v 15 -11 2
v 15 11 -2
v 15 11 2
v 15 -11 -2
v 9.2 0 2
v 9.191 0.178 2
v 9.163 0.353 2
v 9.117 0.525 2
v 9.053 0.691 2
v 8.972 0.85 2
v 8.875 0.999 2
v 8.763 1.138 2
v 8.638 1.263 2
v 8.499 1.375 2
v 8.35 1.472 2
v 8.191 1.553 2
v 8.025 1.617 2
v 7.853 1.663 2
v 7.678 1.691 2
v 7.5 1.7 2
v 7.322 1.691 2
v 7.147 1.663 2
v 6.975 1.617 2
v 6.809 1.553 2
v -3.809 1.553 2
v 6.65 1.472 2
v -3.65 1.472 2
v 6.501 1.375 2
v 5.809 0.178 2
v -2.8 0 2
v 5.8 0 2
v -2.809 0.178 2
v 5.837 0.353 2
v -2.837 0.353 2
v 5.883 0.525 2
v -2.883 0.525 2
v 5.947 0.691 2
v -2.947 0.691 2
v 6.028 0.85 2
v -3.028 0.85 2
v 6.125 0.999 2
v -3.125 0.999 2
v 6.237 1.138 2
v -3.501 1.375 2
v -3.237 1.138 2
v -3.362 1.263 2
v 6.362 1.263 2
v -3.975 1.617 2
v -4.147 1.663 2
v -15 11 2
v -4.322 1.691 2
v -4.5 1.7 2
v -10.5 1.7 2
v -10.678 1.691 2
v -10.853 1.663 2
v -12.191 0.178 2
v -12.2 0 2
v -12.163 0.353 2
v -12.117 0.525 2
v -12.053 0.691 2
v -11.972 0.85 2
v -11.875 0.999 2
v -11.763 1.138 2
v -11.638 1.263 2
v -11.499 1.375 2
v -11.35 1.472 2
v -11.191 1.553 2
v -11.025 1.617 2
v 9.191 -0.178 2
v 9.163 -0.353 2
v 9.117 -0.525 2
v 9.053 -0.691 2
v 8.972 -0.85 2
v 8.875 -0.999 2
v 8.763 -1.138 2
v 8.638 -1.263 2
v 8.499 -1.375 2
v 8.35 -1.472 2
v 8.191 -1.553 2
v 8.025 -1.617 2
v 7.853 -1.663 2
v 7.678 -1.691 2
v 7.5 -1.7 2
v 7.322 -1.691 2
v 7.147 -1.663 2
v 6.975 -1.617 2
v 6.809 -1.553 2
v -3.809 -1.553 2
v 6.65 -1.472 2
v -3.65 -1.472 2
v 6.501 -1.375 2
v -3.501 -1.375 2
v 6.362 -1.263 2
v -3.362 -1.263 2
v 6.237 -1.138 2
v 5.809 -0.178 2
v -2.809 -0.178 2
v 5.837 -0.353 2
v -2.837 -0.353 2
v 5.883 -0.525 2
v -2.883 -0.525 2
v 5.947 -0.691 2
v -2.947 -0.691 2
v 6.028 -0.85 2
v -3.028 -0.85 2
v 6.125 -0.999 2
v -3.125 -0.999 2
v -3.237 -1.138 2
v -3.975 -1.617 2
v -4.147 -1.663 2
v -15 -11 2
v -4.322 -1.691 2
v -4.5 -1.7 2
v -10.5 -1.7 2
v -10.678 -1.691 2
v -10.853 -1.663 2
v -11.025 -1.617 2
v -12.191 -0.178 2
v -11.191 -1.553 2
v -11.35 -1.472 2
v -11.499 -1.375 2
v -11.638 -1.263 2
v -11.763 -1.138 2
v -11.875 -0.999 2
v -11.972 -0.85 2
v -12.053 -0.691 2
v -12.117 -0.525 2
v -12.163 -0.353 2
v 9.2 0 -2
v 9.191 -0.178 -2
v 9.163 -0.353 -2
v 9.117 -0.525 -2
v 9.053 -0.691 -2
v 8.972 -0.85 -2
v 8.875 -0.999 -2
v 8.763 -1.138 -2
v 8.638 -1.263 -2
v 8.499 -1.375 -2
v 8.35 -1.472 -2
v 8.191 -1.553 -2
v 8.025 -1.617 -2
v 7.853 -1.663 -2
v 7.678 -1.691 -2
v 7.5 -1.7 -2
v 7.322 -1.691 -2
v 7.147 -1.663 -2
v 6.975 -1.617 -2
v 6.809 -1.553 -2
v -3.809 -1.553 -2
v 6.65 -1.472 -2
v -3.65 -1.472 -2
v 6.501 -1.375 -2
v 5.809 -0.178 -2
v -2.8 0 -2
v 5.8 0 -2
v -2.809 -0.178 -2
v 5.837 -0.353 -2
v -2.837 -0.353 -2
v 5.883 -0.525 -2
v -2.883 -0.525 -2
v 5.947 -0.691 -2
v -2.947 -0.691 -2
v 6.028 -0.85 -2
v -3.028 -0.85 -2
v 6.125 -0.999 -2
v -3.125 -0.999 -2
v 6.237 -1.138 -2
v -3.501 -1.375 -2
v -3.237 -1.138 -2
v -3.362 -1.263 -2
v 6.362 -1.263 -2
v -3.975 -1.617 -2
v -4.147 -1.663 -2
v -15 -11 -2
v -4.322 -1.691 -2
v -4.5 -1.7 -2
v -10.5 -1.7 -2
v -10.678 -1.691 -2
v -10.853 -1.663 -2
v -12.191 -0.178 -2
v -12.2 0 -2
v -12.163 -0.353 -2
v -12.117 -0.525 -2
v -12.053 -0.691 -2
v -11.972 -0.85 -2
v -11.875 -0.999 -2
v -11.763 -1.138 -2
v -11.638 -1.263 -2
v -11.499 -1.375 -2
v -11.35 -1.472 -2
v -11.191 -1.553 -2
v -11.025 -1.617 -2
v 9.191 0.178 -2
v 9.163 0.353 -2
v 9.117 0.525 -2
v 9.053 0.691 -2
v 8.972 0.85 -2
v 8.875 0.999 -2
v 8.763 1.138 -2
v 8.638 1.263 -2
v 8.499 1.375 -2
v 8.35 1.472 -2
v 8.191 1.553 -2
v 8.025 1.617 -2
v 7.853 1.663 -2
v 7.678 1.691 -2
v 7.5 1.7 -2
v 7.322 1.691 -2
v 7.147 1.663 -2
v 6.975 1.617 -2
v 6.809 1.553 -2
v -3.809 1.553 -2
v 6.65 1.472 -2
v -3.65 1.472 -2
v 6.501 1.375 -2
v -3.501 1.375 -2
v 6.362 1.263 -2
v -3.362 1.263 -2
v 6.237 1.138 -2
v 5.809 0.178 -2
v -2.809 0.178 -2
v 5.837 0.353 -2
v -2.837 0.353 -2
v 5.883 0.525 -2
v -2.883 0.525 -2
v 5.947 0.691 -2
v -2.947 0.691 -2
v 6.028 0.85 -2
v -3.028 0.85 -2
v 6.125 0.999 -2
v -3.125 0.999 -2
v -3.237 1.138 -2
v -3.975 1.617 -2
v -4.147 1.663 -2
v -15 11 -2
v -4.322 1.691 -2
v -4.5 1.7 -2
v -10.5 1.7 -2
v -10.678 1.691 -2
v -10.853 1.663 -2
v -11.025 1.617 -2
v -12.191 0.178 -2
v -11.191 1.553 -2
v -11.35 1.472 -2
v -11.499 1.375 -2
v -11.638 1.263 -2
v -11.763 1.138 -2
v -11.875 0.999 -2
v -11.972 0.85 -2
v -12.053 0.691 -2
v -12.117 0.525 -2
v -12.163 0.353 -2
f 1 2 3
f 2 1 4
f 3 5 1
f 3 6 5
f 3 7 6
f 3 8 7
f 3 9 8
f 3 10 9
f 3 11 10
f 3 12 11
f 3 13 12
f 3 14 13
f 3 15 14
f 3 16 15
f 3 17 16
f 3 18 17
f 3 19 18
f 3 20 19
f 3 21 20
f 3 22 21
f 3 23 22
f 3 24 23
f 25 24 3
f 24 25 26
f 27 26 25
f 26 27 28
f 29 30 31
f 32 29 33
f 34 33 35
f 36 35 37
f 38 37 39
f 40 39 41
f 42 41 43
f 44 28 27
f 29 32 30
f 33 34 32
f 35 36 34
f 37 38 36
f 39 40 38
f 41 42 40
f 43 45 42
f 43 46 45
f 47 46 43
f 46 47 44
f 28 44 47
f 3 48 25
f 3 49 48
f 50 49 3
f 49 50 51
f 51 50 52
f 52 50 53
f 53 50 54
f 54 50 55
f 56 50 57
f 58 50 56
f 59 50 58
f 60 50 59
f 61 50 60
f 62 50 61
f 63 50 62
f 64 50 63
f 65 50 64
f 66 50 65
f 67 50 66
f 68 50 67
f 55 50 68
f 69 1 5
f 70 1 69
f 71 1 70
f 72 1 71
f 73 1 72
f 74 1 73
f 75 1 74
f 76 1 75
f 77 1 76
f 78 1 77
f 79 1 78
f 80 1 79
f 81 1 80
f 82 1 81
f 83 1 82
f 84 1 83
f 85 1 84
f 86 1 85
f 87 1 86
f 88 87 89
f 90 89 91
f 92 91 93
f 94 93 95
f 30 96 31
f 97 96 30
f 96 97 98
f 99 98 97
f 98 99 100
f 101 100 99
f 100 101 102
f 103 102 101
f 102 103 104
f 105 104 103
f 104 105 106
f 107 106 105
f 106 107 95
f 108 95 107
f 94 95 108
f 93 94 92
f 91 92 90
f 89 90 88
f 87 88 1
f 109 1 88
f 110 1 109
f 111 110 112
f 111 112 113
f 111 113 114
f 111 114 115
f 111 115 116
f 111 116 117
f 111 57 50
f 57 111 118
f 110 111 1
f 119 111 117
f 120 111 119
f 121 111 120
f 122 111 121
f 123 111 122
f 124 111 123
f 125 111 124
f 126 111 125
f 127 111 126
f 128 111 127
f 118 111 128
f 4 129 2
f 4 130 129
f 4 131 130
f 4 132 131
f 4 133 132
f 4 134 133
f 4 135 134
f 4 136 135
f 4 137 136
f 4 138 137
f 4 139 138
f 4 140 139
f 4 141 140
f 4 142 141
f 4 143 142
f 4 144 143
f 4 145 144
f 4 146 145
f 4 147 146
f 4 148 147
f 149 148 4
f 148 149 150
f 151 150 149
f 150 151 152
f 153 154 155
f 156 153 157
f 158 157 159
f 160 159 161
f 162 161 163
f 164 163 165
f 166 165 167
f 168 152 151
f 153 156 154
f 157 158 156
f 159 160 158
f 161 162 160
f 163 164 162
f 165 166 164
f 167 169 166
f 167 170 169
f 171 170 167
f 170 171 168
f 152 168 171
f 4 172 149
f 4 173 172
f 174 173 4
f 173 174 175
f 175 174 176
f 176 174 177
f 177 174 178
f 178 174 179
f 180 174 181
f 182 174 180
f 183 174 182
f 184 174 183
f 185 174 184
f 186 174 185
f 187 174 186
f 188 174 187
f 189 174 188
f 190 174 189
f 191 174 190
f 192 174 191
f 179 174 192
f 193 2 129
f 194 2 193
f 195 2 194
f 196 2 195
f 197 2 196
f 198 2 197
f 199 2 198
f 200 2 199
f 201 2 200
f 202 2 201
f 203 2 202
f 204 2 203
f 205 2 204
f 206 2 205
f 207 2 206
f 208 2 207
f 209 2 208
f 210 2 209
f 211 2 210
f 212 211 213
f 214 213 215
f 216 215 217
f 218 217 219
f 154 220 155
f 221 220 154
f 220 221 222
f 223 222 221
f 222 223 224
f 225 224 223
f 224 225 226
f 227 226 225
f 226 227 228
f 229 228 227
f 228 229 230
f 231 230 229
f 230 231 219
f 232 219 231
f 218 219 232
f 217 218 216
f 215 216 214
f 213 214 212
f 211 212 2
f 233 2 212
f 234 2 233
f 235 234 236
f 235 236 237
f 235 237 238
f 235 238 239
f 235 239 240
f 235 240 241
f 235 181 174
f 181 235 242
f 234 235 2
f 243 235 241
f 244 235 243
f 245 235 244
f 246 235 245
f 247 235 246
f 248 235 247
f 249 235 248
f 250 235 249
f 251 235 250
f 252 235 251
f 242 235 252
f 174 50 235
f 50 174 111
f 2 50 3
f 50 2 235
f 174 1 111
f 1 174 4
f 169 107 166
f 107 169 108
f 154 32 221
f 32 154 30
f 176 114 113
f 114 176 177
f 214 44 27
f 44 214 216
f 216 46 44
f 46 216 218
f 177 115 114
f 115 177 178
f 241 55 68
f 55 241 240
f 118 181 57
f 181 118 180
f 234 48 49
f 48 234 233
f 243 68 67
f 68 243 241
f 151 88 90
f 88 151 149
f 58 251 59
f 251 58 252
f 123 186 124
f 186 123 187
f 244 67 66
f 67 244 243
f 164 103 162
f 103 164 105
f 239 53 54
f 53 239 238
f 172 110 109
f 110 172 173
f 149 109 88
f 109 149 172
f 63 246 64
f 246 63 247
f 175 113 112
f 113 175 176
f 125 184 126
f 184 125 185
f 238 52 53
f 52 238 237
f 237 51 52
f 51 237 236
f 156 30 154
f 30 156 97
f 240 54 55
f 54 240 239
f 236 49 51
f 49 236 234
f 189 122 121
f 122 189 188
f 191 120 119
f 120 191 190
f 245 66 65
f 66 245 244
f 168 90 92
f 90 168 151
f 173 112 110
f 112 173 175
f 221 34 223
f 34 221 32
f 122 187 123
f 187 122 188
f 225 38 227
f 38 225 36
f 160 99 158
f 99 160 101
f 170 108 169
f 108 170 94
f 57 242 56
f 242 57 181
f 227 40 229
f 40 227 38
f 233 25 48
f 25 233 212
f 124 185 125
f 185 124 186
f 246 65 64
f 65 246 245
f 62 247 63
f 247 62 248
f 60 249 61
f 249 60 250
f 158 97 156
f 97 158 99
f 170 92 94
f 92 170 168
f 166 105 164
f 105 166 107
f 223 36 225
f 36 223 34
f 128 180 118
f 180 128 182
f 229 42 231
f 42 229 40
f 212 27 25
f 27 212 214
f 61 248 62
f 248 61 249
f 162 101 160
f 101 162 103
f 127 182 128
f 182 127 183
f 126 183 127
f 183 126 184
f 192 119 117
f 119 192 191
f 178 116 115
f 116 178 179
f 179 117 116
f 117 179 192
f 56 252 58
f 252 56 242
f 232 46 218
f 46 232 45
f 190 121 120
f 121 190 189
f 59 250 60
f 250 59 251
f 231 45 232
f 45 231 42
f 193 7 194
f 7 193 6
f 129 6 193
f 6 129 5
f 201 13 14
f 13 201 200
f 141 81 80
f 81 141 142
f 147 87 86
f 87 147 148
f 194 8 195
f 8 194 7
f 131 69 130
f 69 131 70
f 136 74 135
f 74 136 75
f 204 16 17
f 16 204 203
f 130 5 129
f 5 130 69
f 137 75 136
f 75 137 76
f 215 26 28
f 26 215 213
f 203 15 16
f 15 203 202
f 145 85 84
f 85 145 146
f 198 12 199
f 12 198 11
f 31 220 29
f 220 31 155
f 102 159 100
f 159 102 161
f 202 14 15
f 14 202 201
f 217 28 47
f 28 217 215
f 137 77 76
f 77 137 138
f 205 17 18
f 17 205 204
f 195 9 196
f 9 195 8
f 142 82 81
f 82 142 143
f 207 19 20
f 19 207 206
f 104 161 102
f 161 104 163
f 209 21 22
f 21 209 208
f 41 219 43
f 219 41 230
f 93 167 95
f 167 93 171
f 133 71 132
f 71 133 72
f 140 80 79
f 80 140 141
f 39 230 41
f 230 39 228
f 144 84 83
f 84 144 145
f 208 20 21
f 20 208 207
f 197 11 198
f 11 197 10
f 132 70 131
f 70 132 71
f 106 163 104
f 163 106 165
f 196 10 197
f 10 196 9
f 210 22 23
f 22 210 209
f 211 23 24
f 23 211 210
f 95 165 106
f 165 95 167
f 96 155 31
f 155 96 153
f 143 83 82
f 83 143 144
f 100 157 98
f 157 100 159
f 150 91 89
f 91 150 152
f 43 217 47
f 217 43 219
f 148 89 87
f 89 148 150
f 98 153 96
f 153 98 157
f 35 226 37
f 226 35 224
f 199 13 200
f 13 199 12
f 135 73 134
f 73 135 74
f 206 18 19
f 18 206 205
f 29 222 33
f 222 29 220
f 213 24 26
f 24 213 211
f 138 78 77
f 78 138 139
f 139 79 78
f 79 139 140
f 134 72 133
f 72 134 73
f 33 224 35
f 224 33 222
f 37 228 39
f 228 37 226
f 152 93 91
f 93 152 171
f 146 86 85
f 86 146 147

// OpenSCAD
// Adjustable sensor mounting tab.
$fn = 60;
eps = 0.02;
length = 30;
width = 22;
thickness = 4;
slot_l = 6;
module slot(x) { hull() { translate([x-slot_l/2,0,-thickness/2-eps]) cylinder(d=3.4,h=thickness+2*eps); translate([x+slot_l/2,0,-thickness/2-eps]) cylinder(d=3.4,h=thickness+2*eps); } }
difference() { cube([length,width,thickness],center=true); slot(-length/4); translate([length/4,0,-thickness/2-eps]) cylinder(d=3.4,h=thickness+2*eps); }
